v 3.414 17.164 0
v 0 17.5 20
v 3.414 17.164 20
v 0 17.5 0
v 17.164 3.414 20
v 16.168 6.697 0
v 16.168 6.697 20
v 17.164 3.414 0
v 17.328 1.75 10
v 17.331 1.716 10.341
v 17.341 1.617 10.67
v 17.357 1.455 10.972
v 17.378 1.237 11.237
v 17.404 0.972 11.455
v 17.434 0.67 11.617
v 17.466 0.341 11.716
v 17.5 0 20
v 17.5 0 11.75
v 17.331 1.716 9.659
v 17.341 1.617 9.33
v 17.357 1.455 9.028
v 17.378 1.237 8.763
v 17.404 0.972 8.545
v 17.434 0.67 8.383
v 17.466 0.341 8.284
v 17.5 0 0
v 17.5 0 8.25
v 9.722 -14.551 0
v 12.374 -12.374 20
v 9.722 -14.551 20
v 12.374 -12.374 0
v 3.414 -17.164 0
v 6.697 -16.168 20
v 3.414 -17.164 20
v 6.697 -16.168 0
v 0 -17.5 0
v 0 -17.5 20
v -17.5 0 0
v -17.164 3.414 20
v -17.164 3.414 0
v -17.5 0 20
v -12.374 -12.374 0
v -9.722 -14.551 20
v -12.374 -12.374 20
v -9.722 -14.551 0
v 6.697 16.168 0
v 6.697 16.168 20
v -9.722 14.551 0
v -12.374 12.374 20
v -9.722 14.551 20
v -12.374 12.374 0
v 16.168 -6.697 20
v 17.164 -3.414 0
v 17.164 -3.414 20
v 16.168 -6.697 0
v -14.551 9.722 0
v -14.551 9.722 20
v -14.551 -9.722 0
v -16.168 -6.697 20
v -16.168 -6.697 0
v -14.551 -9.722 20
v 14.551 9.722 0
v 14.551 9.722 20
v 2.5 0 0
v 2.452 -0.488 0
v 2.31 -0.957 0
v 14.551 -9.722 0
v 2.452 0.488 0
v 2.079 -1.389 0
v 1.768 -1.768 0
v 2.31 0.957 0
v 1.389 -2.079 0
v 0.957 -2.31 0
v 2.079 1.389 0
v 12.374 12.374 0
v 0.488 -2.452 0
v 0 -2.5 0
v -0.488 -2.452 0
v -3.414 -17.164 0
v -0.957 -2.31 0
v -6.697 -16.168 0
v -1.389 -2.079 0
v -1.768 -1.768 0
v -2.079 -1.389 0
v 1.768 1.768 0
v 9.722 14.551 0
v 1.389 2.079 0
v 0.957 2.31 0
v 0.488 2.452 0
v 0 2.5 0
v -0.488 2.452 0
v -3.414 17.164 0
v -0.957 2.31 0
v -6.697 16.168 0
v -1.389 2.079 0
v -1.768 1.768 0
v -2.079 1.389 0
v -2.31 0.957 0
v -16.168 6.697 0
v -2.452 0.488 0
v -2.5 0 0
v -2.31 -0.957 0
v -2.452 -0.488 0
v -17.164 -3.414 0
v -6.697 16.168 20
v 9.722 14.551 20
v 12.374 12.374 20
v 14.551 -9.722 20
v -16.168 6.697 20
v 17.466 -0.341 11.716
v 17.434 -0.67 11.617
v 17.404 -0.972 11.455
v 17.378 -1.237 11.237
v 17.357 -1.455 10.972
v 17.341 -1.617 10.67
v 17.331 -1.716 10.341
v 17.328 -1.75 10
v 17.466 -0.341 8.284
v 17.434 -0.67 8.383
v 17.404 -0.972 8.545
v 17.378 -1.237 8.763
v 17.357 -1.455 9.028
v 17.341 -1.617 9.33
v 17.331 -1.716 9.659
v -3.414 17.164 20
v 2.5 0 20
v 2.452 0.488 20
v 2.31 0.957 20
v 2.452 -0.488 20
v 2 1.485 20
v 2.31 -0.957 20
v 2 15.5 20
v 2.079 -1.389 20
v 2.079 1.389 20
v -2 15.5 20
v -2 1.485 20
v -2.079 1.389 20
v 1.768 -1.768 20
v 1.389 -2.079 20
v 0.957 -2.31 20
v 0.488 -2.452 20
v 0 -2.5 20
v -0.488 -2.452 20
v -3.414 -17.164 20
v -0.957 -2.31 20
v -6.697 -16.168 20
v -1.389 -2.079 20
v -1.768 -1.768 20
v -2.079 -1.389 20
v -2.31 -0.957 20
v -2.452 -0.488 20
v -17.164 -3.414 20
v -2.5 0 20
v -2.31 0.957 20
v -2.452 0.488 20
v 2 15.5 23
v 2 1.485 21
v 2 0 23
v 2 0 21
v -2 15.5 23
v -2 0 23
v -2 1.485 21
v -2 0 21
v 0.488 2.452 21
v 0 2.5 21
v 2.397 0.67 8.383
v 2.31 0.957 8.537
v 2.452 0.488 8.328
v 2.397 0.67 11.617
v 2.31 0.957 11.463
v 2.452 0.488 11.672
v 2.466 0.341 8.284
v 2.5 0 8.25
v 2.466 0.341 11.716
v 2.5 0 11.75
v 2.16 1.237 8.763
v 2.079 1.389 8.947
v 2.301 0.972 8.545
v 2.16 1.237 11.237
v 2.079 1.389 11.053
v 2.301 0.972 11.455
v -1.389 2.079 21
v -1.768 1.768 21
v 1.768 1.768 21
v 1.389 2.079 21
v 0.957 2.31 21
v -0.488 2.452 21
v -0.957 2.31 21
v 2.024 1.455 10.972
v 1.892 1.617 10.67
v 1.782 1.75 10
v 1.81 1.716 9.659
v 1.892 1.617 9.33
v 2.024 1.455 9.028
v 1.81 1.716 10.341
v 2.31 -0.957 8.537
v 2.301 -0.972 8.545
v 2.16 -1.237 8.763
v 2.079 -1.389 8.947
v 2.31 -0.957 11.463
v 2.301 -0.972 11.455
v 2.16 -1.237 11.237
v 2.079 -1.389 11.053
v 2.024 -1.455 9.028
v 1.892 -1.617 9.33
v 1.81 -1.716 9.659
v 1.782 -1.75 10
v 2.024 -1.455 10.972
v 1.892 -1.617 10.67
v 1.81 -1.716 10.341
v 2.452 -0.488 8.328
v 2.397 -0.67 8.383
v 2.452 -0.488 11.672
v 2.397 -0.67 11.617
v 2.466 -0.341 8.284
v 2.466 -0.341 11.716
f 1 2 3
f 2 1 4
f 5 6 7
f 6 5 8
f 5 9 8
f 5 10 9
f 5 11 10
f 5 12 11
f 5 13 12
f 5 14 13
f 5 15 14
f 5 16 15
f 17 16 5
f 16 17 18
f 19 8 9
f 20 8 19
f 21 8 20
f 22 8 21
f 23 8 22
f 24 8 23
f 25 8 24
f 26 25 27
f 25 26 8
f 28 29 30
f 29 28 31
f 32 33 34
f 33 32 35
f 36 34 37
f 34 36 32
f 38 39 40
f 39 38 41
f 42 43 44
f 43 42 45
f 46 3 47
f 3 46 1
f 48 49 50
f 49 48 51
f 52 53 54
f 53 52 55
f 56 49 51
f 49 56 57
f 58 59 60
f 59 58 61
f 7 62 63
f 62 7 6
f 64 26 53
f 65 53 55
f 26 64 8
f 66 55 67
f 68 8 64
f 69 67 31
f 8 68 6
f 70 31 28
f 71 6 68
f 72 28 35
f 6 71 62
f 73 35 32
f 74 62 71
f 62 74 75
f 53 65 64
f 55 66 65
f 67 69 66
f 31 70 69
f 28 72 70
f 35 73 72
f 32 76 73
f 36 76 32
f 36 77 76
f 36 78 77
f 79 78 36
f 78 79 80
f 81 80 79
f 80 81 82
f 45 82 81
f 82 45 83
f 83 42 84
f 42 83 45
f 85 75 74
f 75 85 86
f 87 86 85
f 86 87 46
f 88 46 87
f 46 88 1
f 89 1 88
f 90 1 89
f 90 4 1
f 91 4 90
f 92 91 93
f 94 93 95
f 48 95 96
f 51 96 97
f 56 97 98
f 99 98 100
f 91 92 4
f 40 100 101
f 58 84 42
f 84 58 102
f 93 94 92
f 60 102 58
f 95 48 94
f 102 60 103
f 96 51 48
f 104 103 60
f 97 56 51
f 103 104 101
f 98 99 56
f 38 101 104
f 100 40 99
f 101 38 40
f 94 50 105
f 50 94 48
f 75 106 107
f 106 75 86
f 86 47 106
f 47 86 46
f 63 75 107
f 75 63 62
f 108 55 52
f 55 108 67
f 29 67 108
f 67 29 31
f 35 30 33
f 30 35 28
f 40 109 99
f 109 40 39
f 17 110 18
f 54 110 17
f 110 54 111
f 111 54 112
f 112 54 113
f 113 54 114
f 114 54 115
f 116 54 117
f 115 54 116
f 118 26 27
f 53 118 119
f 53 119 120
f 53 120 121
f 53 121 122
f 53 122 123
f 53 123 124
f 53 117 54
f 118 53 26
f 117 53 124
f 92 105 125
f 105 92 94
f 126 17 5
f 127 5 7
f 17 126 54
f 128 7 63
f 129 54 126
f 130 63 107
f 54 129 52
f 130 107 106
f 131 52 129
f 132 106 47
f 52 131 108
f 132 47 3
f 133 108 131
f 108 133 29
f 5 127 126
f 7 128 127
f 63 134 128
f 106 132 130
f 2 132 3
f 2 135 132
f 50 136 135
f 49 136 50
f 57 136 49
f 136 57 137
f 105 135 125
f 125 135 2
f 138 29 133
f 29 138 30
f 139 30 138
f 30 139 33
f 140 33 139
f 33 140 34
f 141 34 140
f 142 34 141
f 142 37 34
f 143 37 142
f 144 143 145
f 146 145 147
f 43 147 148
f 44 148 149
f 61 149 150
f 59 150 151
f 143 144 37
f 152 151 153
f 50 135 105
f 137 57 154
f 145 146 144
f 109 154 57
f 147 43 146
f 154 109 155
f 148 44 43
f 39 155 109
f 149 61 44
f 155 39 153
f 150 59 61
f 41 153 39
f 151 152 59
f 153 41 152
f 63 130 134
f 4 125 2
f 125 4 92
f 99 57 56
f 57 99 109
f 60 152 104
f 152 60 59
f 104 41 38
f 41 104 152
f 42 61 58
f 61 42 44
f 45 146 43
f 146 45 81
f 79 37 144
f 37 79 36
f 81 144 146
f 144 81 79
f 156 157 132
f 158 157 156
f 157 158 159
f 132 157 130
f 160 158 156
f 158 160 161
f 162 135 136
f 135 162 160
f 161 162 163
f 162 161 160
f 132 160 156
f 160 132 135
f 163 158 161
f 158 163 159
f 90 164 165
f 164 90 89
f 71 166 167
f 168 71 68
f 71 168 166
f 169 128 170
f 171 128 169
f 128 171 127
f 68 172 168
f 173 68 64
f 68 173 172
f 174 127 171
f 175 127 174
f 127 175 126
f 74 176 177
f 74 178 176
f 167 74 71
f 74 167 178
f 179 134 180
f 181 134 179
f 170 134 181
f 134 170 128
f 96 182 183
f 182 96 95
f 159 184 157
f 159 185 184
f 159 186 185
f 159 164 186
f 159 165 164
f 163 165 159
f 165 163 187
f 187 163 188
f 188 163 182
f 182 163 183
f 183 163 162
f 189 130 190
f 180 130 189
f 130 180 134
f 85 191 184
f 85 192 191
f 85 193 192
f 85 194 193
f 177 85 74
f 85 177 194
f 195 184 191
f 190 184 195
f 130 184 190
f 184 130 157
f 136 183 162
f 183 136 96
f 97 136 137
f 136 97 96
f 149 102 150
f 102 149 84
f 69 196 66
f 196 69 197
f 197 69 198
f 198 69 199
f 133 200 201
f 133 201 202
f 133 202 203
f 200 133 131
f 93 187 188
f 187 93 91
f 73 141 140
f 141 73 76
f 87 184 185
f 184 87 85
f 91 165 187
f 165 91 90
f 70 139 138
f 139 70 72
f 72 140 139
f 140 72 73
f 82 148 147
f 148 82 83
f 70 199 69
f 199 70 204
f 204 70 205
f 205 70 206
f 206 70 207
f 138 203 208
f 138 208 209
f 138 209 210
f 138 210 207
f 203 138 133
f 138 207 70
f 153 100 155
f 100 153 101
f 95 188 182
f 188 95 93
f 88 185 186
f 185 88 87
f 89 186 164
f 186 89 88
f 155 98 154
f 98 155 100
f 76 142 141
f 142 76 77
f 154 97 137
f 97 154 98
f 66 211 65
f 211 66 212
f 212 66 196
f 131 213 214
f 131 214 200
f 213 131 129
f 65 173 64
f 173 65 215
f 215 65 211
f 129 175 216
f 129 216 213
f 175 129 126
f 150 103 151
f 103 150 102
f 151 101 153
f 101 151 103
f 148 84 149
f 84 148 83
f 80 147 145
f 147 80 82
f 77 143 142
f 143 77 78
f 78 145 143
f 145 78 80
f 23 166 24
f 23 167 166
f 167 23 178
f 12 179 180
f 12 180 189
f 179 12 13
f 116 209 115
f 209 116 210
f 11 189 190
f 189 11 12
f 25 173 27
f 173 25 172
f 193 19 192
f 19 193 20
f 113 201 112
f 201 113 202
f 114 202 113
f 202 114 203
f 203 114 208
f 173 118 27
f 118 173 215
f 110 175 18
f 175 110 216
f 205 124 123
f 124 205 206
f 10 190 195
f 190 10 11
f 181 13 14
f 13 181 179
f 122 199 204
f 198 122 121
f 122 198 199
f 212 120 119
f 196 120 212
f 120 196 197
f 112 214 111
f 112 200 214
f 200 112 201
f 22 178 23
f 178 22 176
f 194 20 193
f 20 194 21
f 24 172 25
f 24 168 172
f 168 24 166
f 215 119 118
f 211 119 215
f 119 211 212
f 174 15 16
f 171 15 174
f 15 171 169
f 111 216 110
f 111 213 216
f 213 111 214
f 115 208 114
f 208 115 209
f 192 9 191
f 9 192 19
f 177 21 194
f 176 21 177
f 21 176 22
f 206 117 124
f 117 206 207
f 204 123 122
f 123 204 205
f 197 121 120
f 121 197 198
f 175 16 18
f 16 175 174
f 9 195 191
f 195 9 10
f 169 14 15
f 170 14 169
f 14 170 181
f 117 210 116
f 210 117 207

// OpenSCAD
$fn = 32;

// ----------------------------------------------------------------------
// Control knob: pointer knob
// ----------------------------------------------------------------------

// --- parameters (mm) ---
rib_w = 4;                // pointer rib width
rib_h = 4;                // pointer rib height
knob_d = 35;              // knob body diameter
knob_h = 20;              // knob body height
bore_d = 5;               // shaft bore diameter
set_d = 3.5;              // set screw bore diameter
fit_tol = 0.02;           // tolerance for press fits, mm
free_tol = 0.2;           // tolerance for clearance fits, mm

rib_poke = rib_h - 1;  // rib height above the top
total_h = knob_h + rib_h - 1;  // overall height

difference() {
  union() {
    cylinder(h = knob_h, d = knob_d);
    translate([-rib_w / 2, 0, knob_h - 1])
      cube([rib_w, knob_d / 2 - 2, rib_h]);
  }
  translate([0, 0, -1]) cylinder(h = knob_h + 2, d = bore_d);
  translate([-1, 0, knob_h / 2]) rotate([0, 90, 0])
    cylinder(h = knob_d / 2 + bore_d / 2 + 2, d = set_d);}
